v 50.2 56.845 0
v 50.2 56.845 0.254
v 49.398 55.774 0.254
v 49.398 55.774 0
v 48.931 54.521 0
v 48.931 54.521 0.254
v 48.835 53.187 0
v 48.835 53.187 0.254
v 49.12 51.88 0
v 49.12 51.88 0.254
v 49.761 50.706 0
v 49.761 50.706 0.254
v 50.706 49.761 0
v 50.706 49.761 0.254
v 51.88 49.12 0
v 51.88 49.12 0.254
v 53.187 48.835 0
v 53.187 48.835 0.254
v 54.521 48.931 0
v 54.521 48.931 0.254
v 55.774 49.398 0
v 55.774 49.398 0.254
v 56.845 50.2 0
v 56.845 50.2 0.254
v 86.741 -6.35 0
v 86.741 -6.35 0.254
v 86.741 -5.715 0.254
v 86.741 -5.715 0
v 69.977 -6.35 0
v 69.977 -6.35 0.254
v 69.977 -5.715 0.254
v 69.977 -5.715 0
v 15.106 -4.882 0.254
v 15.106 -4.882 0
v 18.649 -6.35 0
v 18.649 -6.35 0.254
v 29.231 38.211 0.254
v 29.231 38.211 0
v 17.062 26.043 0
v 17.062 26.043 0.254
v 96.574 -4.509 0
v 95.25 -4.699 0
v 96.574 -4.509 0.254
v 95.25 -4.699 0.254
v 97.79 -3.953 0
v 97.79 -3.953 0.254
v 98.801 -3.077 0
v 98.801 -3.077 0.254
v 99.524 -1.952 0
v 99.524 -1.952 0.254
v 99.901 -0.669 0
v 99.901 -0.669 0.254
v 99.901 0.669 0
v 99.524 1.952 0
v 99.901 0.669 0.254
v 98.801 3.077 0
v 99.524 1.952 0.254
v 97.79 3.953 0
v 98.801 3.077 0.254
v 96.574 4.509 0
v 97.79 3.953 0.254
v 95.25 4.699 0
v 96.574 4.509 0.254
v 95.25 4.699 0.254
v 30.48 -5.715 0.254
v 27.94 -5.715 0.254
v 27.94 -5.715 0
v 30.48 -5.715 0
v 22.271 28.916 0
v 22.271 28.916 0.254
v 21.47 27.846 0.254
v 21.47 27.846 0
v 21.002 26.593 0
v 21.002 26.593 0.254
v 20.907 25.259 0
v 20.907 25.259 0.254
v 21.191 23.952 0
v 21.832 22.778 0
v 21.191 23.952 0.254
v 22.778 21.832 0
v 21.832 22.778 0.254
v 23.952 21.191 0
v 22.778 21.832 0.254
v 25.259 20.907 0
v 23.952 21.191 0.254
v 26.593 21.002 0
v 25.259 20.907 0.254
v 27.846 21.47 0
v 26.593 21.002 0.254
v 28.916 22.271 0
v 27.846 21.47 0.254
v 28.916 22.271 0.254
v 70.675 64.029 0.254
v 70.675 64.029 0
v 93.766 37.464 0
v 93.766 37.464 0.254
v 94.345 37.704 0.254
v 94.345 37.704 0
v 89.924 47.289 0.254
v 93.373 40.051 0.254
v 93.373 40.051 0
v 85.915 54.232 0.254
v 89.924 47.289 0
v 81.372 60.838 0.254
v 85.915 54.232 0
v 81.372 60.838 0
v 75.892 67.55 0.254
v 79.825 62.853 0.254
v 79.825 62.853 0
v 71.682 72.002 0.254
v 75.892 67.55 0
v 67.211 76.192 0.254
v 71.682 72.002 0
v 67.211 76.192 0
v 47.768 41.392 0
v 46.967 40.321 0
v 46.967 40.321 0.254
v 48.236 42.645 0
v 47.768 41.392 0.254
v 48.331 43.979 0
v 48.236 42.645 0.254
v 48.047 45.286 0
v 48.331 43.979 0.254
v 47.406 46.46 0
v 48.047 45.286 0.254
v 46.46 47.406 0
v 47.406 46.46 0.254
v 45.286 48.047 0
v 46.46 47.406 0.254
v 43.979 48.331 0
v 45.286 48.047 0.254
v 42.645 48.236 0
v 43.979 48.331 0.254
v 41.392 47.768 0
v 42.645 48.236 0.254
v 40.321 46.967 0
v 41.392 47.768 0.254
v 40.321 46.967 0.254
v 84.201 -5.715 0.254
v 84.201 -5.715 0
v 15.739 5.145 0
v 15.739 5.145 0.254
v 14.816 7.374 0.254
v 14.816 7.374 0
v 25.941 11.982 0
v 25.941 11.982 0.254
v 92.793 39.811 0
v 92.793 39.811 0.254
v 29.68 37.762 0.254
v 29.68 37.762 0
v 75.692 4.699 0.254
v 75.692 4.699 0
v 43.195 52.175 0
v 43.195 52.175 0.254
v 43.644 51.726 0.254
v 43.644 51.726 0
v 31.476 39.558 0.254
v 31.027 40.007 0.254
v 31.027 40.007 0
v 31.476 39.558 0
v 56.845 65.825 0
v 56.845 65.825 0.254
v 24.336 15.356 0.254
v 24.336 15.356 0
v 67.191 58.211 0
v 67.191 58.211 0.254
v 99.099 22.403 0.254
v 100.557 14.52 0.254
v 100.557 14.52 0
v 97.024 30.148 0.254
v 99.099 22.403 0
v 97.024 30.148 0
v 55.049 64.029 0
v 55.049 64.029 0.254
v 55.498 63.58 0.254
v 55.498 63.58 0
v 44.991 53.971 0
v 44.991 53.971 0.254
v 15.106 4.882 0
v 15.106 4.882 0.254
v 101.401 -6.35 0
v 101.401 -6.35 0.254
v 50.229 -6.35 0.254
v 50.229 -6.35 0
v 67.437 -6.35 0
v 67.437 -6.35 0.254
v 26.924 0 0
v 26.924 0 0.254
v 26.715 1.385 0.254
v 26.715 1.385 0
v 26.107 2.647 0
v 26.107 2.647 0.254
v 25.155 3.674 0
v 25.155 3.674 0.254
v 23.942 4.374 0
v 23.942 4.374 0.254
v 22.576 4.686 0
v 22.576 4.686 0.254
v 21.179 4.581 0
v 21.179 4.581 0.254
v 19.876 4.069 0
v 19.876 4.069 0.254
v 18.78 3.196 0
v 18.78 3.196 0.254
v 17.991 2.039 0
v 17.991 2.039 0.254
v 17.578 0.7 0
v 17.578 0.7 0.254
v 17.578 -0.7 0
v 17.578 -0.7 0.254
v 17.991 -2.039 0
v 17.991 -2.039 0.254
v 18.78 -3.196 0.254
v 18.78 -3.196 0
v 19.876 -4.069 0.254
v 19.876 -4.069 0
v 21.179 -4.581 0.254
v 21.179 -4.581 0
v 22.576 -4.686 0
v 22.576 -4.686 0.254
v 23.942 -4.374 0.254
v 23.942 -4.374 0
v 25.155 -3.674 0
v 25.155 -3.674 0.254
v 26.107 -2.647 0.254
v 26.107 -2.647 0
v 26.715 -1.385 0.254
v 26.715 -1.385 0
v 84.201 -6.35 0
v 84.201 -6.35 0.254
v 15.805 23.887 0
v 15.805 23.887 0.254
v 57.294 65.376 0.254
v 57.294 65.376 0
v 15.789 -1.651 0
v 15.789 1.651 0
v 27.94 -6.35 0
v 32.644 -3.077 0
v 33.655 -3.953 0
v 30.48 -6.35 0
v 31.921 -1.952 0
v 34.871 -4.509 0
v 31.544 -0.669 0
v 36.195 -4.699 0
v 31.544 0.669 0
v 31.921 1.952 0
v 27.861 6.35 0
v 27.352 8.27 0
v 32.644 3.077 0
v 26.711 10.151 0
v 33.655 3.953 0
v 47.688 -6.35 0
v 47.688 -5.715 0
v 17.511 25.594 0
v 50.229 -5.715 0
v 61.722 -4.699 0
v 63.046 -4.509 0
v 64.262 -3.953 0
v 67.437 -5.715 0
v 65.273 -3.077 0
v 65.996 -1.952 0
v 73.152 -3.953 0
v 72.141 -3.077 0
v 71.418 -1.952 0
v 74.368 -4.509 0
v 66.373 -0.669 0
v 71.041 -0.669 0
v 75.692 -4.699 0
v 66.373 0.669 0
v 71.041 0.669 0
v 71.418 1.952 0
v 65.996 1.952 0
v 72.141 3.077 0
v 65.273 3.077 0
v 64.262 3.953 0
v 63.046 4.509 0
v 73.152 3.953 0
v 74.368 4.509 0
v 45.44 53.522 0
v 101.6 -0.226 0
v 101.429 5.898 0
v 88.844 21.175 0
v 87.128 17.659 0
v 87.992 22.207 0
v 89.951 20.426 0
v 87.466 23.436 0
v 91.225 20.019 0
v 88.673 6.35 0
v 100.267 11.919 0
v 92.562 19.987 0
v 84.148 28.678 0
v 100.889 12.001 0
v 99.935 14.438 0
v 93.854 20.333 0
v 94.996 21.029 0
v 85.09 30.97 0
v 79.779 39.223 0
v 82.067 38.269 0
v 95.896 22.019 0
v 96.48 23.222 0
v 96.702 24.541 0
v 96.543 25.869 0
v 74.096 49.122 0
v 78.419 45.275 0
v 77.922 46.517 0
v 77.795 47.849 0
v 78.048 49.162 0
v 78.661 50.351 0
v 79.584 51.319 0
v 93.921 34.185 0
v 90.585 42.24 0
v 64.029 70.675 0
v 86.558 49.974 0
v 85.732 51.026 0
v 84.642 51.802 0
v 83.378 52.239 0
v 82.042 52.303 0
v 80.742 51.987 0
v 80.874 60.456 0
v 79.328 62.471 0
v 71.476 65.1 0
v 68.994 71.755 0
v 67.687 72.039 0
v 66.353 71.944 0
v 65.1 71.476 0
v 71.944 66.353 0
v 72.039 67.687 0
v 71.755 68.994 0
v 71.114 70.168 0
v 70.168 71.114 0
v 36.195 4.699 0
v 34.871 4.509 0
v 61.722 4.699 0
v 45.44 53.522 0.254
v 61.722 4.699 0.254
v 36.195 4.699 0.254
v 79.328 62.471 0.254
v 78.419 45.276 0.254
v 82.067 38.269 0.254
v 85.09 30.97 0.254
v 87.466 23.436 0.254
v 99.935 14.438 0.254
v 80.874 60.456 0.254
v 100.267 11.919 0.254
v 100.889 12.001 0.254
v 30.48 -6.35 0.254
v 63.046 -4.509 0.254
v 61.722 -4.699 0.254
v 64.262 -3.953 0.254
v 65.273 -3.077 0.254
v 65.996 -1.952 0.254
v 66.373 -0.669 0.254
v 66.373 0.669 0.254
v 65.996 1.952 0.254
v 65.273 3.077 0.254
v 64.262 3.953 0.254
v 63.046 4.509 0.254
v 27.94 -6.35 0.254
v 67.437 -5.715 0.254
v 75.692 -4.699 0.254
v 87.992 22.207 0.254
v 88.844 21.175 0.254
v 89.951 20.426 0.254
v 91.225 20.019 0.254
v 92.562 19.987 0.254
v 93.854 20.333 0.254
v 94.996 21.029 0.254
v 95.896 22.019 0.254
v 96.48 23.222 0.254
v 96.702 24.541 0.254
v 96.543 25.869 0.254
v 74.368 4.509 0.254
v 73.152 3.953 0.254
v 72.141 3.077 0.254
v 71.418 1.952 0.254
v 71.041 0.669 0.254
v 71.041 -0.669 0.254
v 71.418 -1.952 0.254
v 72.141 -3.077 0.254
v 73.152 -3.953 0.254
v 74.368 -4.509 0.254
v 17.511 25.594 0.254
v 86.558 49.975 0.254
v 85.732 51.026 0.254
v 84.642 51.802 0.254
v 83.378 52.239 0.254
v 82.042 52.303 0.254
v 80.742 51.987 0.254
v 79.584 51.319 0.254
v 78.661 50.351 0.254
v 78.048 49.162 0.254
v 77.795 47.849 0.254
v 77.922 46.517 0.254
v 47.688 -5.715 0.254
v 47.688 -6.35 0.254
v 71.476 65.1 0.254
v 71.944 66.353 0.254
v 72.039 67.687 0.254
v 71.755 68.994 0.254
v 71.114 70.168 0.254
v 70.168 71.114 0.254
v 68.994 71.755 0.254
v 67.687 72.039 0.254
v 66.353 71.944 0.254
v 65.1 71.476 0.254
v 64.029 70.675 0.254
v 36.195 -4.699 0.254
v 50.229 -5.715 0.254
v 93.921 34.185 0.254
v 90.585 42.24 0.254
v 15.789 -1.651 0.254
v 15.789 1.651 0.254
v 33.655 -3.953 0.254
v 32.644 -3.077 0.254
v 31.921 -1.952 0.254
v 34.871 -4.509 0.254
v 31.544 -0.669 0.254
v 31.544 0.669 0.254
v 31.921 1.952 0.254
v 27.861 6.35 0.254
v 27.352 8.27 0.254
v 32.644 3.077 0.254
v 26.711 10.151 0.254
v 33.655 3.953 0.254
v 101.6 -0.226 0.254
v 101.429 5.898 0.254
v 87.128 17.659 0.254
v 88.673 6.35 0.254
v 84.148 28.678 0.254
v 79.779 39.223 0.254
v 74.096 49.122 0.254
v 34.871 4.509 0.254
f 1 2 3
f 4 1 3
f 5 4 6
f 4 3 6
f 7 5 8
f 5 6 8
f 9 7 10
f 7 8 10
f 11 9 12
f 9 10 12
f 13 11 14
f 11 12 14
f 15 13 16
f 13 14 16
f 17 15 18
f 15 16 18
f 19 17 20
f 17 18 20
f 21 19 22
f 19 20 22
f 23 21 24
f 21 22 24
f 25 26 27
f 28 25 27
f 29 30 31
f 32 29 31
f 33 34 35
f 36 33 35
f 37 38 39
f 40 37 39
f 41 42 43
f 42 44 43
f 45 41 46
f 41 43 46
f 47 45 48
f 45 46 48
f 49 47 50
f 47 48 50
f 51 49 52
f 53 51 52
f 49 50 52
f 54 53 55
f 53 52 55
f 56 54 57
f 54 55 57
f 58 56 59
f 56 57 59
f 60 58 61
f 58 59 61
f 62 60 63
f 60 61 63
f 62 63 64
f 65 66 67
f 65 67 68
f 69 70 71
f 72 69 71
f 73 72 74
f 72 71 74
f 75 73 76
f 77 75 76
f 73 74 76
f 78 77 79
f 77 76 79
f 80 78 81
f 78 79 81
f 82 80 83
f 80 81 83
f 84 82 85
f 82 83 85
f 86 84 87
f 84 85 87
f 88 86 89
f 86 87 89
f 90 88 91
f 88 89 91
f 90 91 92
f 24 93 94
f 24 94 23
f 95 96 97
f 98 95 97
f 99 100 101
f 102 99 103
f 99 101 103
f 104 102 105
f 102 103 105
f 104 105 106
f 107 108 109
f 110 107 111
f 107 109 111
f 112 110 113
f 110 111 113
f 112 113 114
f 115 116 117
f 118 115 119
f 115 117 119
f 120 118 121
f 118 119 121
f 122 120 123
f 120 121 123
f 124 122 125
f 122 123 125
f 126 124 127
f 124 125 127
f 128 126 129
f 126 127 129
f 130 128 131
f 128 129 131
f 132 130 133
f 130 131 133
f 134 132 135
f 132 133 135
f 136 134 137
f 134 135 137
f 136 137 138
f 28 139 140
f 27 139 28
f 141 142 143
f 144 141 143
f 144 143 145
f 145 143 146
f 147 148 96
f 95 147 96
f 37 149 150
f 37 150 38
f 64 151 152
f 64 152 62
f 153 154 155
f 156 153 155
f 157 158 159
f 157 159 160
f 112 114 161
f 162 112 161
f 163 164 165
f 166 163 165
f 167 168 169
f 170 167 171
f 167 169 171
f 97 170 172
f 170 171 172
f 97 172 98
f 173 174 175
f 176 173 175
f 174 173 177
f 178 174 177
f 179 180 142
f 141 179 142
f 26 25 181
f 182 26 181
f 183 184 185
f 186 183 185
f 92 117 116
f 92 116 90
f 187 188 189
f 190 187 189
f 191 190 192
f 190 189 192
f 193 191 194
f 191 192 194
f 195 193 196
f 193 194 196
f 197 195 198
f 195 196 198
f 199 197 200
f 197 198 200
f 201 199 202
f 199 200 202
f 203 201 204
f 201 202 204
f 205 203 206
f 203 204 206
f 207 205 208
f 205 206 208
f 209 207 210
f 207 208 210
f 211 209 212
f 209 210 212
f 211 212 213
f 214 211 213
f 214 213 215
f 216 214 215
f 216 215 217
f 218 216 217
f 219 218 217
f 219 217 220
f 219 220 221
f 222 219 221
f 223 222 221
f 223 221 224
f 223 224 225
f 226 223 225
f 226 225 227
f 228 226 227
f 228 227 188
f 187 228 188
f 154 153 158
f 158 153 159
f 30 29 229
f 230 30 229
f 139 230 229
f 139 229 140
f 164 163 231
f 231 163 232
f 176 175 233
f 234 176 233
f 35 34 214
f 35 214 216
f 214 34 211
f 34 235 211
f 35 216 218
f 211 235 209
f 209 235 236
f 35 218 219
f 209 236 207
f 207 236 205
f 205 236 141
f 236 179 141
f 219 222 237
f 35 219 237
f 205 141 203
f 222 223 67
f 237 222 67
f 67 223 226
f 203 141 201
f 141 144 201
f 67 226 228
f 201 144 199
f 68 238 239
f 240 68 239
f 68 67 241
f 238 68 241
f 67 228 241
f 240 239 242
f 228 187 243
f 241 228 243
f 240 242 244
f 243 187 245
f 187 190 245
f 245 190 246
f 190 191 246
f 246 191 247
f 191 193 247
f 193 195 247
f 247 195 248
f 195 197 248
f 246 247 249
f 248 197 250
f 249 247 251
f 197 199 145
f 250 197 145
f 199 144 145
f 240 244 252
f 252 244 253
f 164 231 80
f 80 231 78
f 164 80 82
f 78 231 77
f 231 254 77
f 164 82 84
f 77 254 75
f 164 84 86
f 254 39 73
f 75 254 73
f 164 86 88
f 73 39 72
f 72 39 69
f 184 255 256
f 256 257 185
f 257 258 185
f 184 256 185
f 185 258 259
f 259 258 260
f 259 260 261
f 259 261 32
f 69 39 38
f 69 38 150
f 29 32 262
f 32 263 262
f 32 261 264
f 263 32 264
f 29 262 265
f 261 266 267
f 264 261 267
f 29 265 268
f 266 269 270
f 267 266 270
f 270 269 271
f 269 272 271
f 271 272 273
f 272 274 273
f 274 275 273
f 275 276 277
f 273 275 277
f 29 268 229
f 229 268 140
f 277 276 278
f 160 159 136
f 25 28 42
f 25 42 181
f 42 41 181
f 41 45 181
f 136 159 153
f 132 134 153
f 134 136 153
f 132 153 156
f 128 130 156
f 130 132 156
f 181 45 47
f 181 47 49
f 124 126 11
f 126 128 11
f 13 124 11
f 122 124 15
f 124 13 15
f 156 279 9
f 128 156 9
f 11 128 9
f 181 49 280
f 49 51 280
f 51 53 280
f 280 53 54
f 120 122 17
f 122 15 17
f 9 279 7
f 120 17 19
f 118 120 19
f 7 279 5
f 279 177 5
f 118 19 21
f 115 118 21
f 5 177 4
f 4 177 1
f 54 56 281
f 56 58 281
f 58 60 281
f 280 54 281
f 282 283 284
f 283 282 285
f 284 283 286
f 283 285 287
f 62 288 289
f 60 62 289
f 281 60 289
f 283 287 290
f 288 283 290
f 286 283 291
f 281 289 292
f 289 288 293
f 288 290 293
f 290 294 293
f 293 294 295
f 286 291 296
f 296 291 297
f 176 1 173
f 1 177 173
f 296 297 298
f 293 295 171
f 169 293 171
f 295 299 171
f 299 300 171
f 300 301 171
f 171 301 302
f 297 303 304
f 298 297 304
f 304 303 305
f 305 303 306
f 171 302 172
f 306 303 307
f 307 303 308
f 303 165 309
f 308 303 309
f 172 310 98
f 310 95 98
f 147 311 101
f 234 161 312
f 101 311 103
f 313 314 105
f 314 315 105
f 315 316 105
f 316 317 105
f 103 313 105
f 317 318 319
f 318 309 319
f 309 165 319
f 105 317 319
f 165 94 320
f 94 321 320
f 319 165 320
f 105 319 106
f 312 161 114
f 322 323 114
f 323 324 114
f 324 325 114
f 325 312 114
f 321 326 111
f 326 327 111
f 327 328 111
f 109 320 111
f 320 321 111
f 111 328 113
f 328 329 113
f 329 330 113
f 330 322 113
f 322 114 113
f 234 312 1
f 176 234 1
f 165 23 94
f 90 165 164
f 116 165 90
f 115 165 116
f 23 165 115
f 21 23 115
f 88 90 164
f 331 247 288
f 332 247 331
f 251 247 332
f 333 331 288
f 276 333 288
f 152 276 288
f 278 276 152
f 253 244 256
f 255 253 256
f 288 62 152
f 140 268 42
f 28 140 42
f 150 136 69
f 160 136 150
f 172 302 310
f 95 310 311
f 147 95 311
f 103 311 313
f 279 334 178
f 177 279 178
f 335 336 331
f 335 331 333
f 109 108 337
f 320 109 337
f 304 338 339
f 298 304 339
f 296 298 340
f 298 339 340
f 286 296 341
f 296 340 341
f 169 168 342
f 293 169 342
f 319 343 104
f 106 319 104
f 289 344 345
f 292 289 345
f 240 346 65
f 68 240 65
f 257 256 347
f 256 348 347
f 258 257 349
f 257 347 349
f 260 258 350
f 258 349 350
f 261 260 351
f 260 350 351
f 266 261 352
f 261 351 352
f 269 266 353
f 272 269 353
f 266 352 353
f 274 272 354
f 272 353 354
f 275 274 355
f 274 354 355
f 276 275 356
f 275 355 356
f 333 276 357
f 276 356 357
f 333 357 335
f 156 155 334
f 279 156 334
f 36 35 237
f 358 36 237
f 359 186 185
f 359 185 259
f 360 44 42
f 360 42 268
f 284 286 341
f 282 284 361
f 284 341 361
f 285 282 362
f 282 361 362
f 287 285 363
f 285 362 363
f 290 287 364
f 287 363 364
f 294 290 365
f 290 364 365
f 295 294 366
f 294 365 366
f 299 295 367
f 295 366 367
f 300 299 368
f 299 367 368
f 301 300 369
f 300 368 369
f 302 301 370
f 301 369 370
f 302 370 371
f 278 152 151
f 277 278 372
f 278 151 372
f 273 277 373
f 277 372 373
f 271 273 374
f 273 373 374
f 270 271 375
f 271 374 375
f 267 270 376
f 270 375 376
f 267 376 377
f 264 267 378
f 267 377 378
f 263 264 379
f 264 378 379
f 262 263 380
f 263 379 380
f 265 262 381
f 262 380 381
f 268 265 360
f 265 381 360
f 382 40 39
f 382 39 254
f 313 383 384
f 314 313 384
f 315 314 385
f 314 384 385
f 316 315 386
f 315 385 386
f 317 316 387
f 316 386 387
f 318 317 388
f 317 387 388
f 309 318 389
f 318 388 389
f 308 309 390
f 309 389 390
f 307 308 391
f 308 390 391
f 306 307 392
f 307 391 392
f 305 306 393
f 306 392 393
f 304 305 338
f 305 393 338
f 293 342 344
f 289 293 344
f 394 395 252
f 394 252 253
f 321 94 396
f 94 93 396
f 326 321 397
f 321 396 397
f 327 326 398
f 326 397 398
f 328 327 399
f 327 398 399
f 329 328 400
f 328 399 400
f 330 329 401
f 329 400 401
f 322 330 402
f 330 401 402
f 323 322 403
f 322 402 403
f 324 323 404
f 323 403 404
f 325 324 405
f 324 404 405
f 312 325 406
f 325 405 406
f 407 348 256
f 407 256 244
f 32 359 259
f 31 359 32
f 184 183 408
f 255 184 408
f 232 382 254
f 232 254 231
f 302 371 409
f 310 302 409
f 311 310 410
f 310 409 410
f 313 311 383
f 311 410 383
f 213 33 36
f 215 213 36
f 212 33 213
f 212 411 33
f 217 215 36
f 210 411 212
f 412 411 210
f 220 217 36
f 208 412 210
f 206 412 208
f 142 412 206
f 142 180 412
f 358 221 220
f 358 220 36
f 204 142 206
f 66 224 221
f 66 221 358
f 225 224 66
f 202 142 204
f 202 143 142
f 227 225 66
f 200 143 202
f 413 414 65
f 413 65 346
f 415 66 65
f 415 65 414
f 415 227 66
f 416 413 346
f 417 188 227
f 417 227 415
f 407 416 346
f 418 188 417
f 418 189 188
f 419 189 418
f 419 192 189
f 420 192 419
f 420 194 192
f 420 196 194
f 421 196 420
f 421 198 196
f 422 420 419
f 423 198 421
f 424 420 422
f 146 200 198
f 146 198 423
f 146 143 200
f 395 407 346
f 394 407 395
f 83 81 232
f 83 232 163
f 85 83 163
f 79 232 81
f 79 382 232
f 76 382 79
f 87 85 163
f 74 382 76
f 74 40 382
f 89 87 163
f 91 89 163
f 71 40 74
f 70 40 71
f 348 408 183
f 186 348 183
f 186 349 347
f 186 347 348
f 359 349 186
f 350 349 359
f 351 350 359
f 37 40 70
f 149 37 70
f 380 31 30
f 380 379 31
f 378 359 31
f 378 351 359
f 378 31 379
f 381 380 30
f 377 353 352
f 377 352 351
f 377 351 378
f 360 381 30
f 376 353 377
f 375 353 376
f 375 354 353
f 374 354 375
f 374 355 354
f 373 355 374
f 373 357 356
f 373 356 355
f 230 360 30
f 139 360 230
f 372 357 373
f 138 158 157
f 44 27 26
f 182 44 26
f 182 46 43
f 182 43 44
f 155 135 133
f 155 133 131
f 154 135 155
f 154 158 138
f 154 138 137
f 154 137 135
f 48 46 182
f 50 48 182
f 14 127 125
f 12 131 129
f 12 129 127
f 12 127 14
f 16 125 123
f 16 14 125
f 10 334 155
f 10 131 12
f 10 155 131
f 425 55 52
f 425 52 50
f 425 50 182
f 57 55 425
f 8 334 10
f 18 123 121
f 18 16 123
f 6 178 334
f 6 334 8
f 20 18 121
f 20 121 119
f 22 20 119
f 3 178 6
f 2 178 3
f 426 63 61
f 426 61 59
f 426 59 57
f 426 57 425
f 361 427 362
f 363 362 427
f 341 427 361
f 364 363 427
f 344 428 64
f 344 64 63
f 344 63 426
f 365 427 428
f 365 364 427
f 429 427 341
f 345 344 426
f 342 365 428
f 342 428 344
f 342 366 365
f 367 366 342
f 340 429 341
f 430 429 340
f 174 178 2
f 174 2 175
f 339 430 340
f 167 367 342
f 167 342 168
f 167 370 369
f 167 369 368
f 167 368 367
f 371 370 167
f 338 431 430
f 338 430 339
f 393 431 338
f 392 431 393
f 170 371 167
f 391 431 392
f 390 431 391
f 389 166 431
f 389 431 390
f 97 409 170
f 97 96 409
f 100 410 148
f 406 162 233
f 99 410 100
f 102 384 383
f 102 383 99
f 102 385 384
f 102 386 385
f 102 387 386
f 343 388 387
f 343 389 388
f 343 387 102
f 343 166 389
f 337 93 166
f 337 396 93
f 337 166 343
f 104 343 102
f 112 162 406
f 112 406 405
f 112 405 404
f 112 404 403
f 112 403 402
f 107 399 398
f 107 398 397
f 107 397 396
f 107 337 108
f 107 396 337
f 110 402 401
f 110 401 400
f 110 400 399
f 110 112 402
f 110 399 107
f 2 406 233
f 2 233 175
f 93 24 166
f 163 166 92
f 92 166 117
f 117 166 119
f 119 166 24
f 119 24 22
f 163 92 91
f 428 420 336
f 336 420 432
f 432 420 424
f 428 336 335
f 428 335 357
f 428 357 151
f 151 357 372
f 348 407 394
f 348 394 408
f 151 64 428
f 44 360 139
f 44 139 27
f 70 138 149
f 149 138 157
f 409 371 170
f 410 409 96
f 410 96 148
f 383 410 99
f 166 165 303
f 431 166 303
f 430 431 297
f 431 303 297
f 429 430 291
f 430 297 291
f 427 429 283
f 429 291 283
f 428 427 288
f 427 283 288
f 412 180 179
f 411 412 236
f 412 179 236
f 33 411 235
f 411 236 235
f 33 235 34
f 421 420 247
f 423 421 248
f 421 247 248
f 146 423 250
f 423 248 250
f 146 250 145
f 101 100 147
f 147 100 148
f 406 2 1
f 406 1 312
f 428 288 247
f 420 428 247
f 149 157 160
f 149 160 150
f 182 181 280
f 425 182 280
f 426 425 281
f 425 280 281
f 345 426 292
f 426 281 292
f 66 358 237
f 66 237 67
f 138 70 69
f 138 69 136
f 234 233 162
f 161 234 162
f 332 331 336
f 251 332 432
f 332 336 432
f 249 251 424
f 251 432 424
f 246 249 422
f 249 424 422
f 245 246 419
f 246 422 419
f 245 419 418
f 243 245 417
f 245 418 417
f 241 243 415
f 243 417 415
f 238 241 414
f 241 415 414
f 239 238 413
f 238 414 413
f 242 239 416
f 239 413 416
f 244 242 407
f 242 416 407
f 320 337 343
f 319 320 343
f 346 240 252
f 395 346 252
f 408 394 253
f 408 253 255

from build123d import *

# Parameters (mm, degrees)
BOSS_EXTRUDE1_DEPTH = 0.254
SKETCH2_R           = 4.699
CUT_EXTRUDE1_DEPTH  = 1.254
SKETCH3_W           = 2.54
SKETCH3_H           = 0.635
CUT_EXTRUDE2_DEPTH  = 1.254
CUT_EXTRUDE4_DEPTH  = 1.254
CUT_EXTRUDE5_DEPTH  = 1.254


with BuildPart() as part:
    # Sketch1 → Boss-Extrude1 (new body)
    with BuildSketch(Plane.XY):
        with BuildLine():
            Line((67.21146711, 76.191723231), (8.696654013, 17.676910134))
            Line((8.696654013, 17.676910134), (7.228954972, 14.133571205))
            ThreePointArc((7.228954972, 14.133571205), (14.666587579, 6.075099489), (15.105587123, -4.88230096))
            Line((15.105587123, -4.88230096), (18.648926052, -6.35))
            Line((18.648926052, -6.35), (101.401368334, -6.35))
            ThreePointArc((101.401368334, -6.35), (93.866160503, 38.880636728), (67.21146711, 76.191723231))
        make_face()
        with BuildLine():
            Line((88.672924278, 6.35), (27.86051193, 6.35))
            ThreePointArc((27.86051193, 6.35), (26.399857642, 10.93517908), (24.190484974, 15.210228852))
            Line((24.190484974, 15.210228852), (67.191354125, 58.211098004))
            ThreePointArc((67.191354125, 58.211098004), (82.13289044, 34.020557137), (88.672924278, 6.35))
        make_face(mode=Mode.SUBTRACT)
    extrude(amount=BOSS_EXTRUDE1_DEPTH)

    # Sketch2 → Cut-Extrude1 (cut, through all)
    with BuildSketch(Plane.XY.offset(0.254)):
        with Locations((22.225, 0)):
            Circle(SKETCH2_R)
        with Locations((36.195, 0)):
            Circle(SKETCH2_R)
        with Locations((61.722, 0)):
            Circle(SKETCH2_R)
        with Locations((75.692, 0)):
            Circle(SKETCH2_R)
        with Locations((95.25, 0)):
            Circle(SKETCH2_R)
        with Locations((15.715448212, 15.715448212)):
            Circle(SKETCH2_R)
        with Locations((25.593729945, 25.593729945)):
            Circle(SKETCH2_R)
        with Locations((43.644044748, 43.644044748)):
            Circle(SKETCH2_R)
        with Locations((53.522326482, 53.522326482)):
            Circle(SKETCH2_R)
        with Locations((92.004434954, 24.652514046)):
            Circle(SKETCH2_R)
        with Locations((82.48891971, 47.625)):
            Circle(SKETCH2_R)
        with Locations((67.351920908, 67.351920908)):
            Circle(SKETCH2_R)
    extrude(amount=-CUT_EXTRUDE1_DEPTH, mode=Mode.SUBTRACT)

    # Sketch3 → Cut-Extrude2 (cut, through all)
    with BuildSketch(Plane.XY.offset(0.254)):
        Polygon((15.266435406, 24.246691527), (17.06248663, 26.042742751), (17.511499436, 25.593729945), (15.715448212, 23.797678721), align=None)
        Polygon((44.991083167, 53.971339288), (43.195031942, 52.175288063), (43.644044748, 51.726275257), (45.440095973, 53.522326482), align=None)
        with Locations((29.21, -6.0325)):
            Rectangle(SKETCH3_W, SKETCH3_H)
        with Locations((68.707, -6.0325)):
            Rectangle(SKETCH3_W, SKETCH3_H)
        Polygon((29.230733674, 38.210989795), (31.026784898, 40.007041019), (31.475797704, 39.558028213), (29.67974648, 37.761976989), align=None)
        Polygon((56.845021246, 65.825277367), (55.048970022, 64.029226143), (55.497982828, 63.580213337), (57.294034052, 65.376264561), align=None)
        with Locations((48.9585, -6.0325)):
            Rectangle(SKETCH3_W, SKETCH3_H)
        with Locations((85.471, -6.0325)):
            Rectangle(SKETCH3_W, SKETCH3_H)
        Polygon((99.935462164, 14.437711971), (100.266998693, 11.919442024), (101.526133667, 12.085210288), (101.194597138, 14.603480236), align=None)
        Polygon((93.765504959, 37.464305742), (94.938831965, 37.950313702), (93.966816047, 40.296967714), (92.793489041, 39.810959755), align=None)
        Polygon((79.327792988, 62.471156422), (80.874047017, 60.456038938), (81.88160576, 61.229165953), (80.33535173, 63.244283437), align=None)
        Polygon((13.593916116, 7.005422516), (14.565932035, 4.658768503), (15.739259041, 5.144776462), (14.767243123, 7.491430475), align=None)
    extrude(amount=-CUT_EXTRUDE2_DEPTH, mode=Mode.SUBTRACT)

    # Sketch6 → Cut-Extrude4 (cut, through all)
    with BuildSketch(Plane.XY.offset(0.254)):
        with BuildLine():
            Line((22.27103518, 28.91642471), (40.321349984, 46.966739513))
            ThreePointArc((40.321349984, 46.966739513), (46.966739513, 46.966739513), (46.966739513, 40.321349984))
            Line((46.966739513, 40.321349984), (28.91642471, 22.27103518))
            ThreePointArc((28.91642471, 22.27103518), (22.27103518, 22.27103518), (22.27103518, 28.91642471))
        make_face()
        with BuildLine():
            Line((50.199631717, 56.845021246), (64.029226143, 70.674615673))
            ThreePointArc((64.029226143, 70.674615673), (70.674615673, 70.674615673), (70.674615673, 64.029226143))
            Line((70.674615673, 64.029226143), (56.845021246, 50.199631717))
            ThreePointArc((56.845021246, 50.199631717), (50.199631717, 50.199631717), (50.199631717, 56.845021246))
        make_face()
        with BuildLine():
            Line((61.722, -4.699), (36.195, -4.699))
            ThreePointArc((36.195, -4.699), (31.496, 0), (36.195, 4.699))
            Line((36.195, 4.699), (61.722, 4.699))
            ThreePointArc((61.722, 4.699), (66.421, 0), (61.722, -4.699))
        make_face()
        with BuildLine():
            Line((95.25, -4.699), (75.692, -4.699))
            ThreePointArc((75.692, -4.699), (70.993, 0), (75.692, 4.699))
            Line((75.692, 4.699), (95.25, 4.699))
            ThreePointArc((95.25, 4.699), (99.949, 0), (95.25, -4.699))
        make_face()
        with BuildLine():
            ThreePointArc((96.543320412, 25.868704739), (92.340835395, 38.248826381), (86.558373083, 49.9745))
            ThreePointArc((86.558373083, 49.9745), (80.13941971, 51.694453372), (78.419466338, 45.2755))
            ThreePointArc((78.419466338, 45.2755), (83.658215548, 34.652367484), (87.465549496, 23.436323353))
            ThreePointArc((87.465549496, 23.436323353), (93.220625647, 20.113628588), (96.543320412, 25.868704739))
        make_face()
    extrude(amount=-CUT_EXTRUDE4_DEPTH, mode=Mode.SUBTRACT)

    # Sketch5 → Cut-Extrude5 (cut, through all)
    with BuildSketch(Plane.XY.offset(0.254)):
        Polygon((8.418953573, 4.724419036), (27.192185674, 12.500546382), (12.82377588, 26.868956175), (-0.450903843, 13.594276452), align=None)
    extrude(amount=-CUT_EXTRUDE5_DEPTH, mode=Mode.SUBTRACT)


solid = part.part
